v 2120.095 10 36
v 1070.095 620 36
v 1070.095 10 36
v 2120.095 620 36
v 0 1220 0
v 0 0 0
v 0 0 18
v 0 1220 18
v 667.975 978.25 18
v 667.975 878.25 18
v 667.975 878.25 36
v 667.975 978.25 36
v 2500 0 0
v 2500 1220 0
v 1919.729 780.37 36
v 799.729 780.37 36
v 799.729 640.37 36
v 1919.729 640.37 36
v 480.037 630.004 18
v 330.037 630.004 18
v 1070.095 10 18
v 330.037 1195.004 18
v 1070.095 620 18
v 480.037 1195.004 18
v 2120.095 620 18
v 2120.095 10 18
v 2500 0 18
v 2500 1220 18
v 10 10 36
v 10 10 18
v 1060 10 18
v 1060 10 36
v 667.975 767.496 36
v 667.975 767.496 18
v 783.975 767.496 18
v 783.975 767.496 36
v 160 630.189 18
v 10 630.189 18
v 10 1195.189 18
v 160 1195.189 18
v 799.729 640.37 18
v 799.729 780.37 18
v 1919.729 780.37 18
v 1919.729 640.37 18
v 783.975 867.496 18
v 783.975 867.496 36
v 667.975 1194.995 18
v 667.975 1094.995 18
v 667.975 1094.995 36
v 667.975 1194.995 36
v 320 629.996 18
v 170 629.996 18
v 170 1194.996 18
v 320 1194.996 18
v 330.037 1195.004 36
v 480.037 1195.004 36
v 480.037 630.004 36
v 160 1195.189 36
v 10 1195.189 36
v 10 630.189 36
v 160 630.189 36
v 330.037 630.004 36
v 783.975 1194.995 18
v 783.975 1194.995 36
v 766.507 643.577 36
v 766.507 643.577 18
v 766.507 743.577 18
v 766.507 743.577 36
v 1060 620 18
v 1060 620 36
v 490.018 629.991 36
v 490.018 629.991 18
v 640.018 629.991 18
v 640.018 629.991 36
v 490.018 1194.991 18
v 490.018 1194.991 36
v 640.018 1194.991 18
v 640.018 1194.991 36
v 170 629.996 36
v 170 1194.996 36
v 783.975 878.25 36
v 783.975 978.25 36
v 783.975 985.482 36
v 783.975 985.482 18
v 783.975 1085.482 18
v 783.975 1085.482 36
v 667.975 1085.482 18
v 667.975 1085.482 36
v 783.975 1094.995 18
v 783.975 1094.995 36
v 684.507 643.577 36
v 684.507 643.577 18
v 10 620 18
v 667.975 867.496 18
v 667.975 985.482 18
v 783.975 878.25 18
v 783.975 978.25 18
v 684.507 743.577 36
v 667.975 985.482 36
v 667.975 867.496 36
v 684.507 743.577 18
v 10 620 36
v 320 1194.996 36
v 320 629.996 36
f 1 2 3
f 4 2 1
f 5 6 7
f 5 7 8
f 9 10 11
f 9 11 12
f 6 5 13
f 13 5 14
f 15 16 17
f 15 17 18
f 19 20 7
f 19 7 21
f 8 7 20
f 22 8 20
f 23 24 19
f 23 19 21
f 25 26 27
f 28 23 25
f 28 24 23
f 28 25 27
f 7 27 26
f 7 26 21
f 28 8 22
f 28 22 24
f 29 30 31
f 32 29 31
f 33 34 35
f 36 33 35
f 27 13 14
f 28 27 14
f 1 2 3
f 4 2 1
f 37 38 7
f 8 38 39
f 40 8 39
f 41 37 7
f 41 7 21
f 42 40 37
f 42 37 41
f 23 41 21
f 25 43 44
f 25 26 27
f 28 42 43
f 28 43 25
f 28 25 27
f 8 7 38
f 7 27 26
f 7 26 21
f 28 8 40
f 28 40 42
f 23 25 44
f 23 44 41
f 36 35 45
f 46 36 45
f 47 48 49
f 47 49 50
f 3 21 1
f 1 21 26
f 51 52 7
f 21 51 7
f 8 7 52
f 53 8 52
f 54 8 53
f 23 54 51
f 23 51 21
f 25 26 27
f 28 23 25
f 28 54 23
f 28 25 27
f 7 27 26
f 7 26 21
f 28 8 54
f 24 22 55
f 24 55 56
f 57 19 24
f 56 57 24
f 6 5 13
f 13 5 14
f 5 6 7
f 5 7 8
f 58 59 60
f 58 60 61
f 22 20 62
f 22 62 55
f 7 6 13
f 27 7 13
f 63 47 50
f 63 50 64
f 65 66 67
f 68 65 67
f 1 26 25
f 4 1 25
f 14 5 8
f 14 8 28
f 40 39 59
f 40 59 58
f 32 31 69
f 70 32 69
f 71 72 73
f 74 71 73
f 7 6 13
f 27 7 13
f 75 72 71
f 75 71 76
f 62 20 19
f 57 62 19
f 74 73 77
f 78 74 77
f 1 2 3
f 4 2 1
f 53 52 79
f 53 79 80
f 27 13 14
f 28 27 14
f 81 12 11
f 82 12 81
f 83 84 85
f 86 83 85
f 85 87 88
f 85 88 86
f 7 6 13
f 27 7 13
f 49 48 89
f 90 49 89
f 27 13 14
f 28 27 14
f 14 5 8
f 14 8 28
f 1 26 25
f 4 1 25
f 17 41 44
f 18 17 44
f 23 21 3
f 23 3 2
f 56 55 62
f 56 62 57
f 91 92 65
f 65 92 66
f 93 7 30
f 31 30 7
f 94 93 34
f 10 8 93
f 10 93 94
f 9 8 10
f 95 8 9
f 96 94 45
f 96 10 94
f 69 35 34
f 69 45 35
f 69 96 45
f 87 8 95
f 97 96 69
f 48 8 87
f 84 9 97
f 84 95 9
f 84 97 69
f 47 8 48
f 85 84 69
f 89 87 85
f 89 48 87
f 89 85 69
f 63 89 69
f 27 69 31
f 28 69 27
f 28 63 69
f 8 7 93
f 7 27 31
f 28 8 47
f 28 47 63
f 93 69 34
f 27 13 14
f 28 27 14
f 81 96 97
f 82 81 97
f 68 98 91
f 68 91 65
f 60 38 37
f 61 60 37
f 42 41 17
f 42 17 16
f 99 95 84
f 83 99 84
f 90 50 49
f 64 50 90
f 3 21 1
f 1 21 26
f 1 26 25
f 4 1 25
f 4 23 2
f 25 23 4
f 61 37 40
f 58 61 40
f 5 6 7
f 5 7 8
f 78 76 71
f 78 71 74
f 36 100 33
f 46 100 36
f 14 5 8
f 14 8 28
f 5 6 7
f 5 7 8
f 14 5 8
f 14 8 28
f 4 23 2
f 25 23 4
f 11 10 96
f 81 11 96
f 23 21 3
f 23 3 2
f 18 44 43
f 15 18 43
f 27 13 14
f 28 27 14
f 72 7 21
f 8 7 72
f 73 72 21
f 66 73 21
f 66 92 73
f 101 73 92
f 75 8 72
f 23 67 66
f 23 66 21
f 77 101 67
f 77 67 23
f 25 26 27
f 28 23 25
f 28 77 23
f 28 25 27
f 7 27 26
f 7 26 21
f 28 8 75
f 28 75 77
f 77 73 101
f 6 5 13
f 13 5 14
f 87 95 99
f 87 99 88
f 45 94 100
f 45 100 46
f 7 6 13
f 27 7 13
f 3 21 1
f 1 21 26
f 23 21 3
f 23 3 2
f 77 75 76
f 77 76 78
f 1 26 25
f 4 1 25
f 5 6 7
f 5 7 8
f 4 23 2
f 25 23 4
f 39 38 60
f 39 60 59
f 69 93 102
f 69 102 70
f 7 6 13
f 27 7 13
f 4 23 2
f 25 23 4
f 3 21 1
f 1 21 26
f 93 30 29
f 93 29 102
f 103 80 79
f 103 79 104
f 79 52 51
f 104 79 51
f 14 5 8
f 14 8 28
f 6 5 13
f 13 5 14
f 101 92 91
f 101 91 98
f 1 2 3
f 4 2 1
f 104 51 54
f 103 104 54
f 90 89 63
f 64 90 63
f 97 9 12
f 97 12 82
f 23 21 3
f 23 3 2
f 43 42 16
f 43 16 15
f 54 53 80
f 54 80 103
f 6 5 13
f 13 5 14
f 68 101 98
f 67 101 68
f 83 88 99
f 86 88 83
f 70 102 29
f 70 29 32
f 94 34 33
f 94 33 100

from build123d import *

# Parameters (mm, degrees)
BOX_W        = 2500
BOX_H        = 1220
BOX_DEPTH    = 18
SKETCH002_W  = 1050
SKETCH002_H  = 610
PAD_DEPTH    = 18
SKETCH005_W  = 150
SKETCH005_H  = 565
PAD004_DEPTH = 18
SKETCH004_W  = 150
SKETCH004_H  = 565
PAD005_DEPTH = 18
SKETCH_W     = 1050
SKETCH_H     = 610
PAD001_DEPTH = 18
SKETCH007_W  = 116
SKETCH007_H  = 100
PAD006_DEPTH = 18
SKETCH003_W  = 150
SKETCH003_H  = 565
PAD002_DEPTH = 18
SKETCH009_W  = 1120
SKETCH009_H  = 140
PAD007_DEPTH = 18
SKETCH006_W  = 150
SKETCH006_H  = 565
PAD003_DEPTH = 18
SKETCH010_W  = 82
SKETCH010_H  = 100
PAD008_DEPTH = 18


with BuildPart() as plaat_18mm_153x310:
    # Box → Box (new body)
    with BuildSketch(Plane.XY):
        with Locations((1250, 610)):
            Rectangle(BOX_W, BOX_H)
    extrude(amount=BOX_DEPTH)


with BuildPart() as pad:
    # Pad base: copy of Plaat 18mm (153x310)
    add(plaat_18mm_153x310.part)

    # Sketch002 → Pad (new body)
    with BuildSketch(Plane.XY.offset(18)):
        with Locations((1595.094727, 315)):
            Rectangle(SKETCH002_W, SKETCH002_H)
    extrude(amount=PAD_DEPTH)


with BuildPart() as pad004:
    # Pad004 base: copy of Pad
    add(pad.part)

    # Sketch005 → Pad004 (new body)
    with BuildSketch(Plane.XY.offset(18)):
        with Locations((405.037323, 912.504272)):
            Rectangle(SKETCH005_W, SKETCH005_H)
    extrude(amount=PAD004_DEPTH)


with BuildPart() as pad005:
    # Pad005 base: copy of Pad
    add(pad.part)

    # Sketch004 → Pad005 (new body)
    with BuildSketch(Plane.XY.offset(18)):
        with Locations((244.99971, 912.496216)):
            Rectangle(SKETCH004_W, SKETCH004_H)
    extrude(amount=PAD005_DEPTH)


with BuildPart() as pad006:
    # Pad001 base: copy of Plaat 18mm (153x310)
    add(plaat_18mm_153x310.part)

    # Sketch → Pad001 (new body)
    with BuildSketch(Plane.XY.offset(18)):
        with Locations((535, 315)):
            Rectangle(SKETCH_W, SKETCH_H)
    extrude(amount=PAD001_DEPTH)

    # Sketch007 → Pad006 (new body)
    with BuildSketch(Plane.XY.offset(18)):
        with Locations((725.975285, 1144.995477)):
            Rectangle(SKETCH007_W, SKETCH007_H)
        with Locations((725.975285, 1035.482117)):
            Rectangle(SKETCH007_W, SKETCH007_H)
        with Locations((725.975285, 817.496331)):
            Rectangle(SKETCH007_W, SKETCH007_H)
        with Locations((725.975285, 928.249755)):
            Rectangle(SKETCH007_W, SKETCH007_H)
    extrude(amount=PAD006_DEPTH)


with BuildPart() as pad007:
    # Pad002 base: copy of Pad
    add(pad.part)

    # Sketch003 → Pad002 (new body)
    with BuildSketch(Plane.XY.offset(18)):
        with Locations((85, 912.688904)):
            Rectangle(SKETCH003_W, SKETCH003_H)
    extrude(amount=PAD002_DEPTH)

    # Sketch009 → Pad007 (new body)
    with BuildSketch(Plane.XY.offset(18)):
        with Locations((1359.729137, 710.37044)):
            Rectangle(SKETCH009_W, SKETCH009_H)
    extrude(amount=PAD007_DEPTH)


with BuildPart() as pad008:
    # Pad003 base: copy of Pad
    add(pad.part)

    # Sketch006 → Pad003 (new body)
    with BuildSketch(Plane.XY.offset(18)):
        with Locations((565.017548, 912.491394)):
            Rectangle(SKETCH006_W, SKETCH006_H)
    extrude(amount=PAD003_DEPTH)

    # Sketch010 → Pad008 (new body)
    with BuildSketch(Plane.XY.offset(18)):
        with Locations((725.507202, 693.577392)):
            Rectangle(SKETCH010_W, SKETCH010_H)
    extrude(amount=PAD008_DEPTH)


solid = Compound([pad004.part, pad005.part, pad006.part, pad007.part, pad008.part])
